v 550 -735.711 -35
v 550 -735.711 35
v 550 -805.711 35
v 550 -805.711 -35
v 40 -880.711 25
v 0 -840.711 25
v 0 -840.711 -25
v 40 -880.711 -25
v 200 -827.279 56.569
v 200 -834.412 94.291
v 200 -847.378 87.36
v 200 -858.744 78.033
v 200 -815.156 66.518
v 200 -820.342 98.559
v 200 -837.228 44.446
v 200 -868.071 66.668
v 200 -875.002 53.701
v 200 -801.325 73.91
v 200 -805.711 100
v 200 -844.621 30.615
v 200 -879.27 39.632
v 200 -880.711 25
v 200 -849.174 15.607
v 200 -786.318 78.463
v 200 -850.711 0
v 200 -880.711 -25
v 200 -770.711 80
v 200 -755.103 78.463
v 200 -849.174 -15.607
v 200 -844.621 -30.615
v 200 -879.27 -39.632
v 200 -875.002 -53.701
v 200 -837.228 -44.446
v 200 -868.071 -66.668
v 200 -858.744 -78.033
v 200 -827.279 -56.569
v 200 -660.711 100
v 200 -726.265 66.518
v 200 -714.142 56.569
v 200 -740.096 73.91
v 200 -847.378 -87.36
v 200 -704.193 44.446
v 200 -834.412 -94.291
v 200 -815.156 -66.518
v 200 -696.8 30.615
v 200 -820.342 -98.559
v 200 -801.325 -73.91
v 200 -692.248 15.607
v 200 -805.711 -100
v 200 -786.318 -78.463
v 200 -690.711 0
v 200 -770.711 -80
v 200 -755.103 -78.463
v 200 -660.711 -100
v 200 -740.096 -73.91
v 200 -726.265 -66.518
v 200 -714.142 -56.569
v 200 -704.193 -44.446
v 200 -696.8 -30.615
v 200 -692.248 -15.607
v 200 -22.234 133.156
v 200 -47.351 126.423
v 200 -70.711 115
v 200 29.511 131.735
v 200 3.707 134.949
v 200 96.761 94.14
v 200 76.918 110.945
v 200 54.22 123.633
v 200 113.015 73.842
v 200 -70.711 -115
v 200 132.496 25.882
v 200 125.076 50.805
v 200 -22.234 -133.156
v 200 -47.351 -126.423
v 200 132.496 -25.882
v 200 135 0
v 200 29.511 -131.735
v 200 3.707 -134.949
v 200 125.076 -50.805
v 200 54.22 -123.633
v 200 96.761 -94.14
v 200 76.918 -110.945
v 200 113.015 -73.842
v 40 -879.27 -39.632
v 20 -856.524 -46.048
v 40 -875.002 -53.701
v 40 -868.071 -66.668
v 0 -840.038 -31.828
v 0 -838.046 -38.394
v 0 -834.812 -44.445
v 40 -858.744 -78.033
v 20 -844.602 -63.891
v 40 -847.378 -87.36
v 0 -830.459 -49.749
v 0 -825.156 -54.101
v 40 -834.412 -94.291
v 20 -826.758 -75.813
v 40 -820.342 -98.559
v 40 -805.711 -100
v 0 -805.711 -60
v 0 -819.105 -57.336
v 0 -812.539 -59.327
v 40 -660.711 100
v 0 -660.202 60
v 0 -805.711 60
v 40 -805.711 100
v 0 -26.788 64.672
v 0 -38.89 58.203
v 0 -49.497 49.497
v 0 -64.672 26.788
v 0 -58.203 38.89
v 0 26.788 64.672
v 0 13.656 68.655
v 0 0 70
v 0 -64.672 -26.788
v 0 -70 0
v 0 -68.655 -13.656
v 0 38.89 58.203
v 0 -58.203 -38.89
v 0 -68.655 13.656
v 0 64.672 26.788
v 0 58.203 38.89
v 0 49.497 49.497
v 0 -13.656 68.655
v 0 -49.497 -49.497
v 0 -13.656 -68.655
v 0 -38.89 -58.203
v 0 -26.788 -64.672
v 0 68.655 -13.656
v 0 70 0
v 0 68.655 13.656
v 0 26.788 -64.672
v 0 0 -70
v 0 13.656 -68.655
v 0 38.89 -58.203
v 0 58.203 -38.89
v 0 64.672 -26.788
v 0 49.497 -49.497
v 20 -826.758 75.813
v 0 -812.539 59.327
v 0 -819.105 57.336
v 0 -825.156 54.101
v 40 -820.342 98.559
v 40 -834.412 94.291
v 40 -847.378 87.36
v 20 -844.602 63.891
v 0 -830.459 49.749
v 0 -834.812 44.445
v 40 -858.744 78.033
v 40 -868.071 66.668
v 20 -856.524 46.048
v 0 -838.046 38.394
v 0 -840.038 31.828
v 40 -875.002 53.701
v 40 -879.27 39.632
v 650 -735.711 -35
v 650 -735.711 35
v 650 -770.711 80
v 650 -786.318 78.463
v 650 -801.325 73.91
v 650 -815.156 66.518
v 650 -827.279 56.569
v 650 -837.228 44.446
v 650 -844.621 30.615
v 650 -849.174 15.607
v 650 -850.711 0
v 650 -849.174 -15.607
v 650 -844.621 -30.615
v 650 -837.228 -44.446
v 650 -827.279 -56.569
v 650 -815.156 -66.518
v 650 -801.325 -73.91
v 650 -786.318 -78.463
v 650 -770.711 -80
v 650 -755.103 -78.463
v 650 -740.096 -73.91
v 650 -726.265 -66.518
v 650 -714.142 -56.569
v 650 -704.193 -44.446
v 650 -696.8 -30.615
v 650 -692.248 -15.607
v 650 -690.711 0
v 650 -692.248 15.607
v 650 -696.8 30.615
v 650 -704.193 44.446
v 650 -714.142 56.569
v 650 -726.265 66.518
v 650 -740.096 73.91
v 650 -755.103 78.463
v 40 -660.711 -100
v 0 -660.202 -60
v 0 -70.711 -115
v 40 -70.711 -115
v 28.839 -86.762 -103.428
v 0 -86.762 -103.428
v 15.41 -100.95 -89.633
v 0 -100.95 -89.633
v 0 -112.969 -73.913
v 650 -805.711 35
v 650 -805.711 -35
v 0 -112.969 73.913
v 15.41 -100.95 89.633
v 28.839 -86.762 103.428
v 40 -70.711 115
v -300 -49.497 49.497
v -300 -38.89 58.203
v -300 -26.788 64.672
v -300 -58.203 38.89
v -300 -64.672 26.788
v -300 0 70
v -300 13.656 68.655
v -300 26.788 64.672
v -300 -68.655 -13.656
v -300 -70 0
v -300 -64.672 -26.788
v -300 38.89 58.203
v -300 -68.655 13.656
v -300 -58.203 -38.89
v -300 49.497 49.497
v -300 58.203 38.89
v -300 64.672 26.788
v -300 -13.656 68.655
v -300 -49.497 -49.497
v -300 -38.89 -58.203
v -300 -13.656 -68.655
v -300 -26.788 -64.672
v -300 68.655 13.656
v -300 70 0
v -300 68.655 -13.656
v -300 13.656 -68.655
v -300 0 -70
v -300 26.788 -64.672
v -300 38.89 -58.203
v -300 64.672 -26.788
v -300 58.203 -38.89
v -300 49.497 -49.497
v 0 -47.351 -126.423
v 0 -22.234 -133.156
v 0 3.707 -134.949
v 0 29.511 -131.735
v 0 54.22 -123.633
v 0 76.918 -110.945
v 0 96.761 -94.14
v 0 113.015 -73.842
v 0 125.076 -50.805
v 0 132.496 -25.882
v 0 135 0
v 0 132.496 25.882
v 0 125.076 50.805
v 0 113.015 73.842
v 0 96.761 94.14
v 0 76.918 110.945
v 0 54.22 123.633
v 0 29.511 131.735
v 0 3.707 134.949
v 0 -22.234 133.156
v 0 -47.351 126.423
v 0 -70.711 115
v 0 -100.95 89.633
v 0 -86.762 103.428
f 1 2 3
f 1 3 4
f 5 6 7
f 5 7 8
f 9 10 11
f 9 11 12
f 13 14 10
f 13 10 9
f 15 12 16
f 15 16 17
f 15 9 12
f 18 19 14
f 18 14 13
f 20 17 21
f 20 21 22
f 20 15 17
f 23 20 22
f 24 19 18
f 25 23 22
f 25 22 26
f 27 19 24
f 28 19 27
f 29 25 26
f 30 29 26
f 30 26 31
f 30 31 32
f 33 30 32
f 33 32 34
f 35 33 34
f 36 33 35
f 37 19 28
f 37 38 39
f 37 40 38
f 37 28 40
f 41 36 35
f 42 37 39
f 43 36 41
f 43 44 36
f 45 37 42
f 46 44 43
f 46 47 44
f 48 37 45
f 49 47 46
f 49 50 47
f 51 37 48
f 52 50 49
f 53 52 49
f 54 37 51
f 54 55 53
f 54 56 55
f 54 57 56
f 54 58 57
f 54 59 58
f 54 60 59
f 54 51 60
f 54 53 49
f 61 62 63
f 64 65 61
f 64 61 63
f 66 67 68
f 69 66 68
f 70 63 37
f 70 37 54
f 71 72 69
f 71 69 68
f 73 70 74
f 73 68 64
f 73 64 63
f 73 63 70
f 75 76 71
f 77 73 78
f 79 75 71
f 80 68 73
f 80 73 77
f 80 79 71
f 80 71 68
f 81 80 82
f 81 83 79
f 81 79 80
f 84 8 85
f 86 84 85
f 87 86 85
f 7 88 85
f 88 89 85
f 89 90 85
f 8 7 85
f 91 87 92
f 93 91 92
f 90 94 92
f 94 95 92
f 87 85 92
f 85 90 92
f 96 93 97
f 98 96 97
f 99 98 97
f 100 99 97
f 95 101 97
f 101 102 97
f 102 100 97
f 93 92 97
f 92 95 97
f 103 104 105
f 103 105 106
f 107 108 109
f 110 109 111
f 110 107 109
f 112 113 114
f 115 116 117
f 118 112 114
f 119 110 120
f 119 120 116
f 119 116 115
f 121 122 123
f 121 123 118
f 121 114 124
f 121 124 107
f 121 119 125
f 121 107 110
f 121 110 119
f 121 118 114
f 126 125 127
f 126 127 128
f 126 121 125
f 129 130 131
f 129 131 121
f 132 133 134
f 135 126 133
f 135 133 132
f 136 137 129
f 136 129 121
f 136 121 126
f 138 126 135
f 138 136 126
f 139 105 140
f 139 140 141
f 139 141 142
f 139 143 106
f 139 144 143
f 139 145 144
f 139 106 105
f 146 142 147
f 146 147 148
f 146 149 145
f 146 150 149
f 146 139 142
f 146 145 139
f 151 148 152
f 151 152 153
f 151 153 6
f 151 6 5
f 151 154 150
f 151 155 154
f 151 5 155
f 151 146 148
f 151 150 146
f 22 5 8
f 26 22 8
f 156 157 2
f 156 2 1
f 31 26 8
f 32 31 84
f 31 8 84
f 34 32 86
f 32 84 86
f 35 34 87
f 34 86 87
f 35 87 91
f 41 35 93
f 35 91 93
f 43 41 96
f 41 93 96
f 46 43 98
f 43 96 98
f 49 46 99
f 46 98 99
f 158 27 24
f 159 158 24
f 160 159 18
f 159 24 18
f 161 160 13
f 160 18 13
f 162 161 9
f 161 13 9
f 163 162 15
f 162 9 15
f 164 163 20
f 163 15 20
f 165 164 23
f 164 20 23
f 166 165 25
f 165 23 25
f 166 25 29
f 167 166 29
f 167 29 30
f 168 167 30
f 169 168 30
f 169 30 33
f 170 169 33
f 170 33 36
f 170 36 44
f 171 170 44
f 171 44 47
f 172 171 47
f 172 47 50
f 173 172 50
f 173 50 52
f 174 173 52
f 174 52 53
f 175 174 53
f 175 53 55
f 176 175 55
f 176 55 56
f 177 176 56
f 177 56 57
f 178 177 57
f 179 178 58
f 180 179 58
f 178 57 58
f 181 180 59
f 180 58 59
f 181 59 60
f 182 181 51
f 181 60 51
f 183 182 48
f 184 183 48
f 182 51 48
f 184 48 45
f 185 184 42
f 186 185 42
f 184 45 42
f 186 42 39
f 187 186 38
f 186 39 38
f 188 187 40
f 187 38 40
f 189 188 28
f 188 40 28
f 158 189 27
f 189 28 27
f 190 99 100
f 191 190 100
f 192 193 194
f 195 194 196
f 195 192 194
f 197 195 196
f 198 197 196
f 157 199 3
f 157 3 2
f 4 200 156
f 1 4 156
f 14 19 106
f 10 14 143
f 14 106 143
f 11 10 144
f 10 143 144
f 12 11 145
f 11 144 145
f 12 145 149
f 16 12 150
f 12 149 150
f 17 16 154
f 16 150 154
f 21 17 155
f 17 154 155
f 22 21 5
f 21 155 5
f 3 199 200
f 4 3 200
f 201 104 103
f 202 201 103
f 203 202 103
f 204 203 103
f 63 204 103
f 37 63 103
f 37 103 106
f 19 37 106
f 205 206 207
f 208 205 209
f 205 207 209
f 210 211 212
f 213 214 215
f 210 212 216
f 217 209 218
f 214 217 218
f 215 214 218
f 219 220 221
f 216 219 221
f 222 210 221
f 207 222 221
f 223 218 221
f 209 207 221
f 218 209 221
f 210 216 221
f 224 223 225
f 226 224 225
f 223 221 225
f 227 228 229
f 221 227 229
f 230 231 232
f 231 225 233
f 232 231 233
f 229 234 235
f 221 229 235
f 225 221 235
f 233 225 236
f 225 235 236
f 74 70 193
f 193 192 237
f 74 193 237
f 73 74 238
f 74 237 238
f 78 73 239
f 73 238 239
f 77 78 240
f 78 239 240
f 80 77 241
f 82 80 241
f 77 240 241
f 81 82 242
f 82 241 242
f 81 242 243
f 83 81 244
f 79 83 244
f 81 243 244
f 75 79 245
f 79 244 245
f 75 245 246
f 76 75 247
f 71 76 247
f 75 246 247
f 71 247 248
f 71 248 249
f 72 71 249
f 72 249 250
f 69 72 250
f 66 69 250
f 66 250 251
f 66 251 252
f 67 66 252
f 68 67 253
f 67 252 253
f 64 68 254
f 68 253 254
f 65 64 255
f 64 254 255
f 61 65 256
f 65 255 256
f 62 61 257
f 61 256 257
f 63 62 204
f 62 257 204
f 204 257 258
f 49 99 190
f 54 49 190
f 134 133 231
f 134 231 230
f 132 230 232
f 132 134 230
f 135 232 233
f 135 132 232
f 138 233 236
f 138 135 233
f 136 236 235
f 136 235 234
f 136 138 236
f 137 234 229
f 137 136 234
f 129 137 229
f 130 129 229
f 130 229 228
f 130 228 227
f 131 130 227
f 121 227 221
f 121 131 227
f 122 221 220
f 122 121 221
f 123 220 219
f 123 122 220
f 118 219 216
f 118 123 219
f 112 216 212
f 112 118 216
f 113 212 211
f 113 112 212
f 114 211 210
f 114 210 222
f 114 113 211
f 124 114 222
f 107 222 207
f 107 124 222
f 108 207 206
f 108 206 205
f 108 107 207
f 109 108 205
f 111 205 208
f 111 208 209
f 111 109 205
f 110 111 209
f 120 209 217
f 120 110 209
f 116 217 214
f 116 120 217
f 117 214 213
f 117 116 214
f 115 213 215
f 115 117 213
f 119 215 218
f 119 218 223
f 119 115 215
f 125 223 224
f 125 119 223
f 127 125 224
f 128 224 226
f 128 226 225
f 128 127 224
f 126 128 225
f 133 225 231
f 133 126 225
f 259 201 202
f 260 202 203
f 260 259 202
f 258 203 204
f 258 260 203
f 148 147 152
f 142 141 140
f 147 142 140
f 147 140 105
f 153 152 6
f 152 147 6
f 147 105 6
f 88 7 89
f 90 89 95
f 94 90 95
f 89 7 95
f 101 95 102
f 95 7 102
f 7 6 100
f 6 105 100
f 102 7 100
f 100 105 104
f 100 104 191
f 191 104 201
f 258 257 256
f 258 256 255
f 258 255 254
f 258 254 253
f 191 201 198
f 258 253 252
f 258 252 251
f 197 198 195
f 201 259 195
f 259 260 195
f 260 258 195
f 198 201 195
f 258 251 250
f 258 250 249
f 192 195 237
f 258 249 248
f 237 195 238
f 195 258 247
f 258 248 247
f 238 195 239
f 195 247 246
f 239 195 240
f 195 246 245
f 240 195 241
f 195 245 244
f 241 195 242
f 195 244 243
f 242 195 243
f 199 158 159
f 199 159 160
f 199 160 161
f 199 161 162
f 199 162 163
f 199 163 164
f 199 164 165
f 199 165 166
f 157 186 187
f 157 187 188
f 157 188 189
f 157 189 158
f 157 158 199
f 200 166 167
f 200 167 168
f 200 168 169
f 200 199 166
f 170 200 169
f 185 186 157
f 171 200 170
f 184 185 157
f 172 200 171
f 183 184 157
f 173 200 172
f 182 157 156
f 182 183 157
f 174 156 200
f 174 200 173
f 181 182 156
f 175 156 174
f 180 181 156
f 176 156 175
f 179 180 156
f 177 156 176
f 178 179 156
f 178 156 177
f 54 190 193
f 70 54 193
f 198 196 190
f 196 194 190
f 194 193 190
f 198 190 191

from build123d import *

# Parameters (mm, degrees)
ESQUISSE1_R             = 80
BOSS_EXTRU_1_DEPTH      = 200
BOSS_EXTRU_3_DEPTH      = 650
ESQUISSE4_W             = 70
ESQUISSE4_H             = 70
ENL_V_MAT_EXTRU_4_DEPTH = 100
ESQUISSE1_6_R           = 70
BOSS_EXTRU_4_DEPTH      = 300
CHANFREIN1_SIZE         = 40


with BuildPart() as part:
    # Esquisse1 → Boss.-Extru.1 (new body)
    with BuildSketch(Plane(origin=(0, 0, 0), x_dir=(0, 0, -1), z_dir=(1, 0, 0))):
        with BuildLine():
            ThreePointArc((115, -70.710678119), (0, 135), (-115, -70.710678119))
            Line((-115, -70.710678119), (-100, -660.710678119))
            Line((-100, -660.710678119), (-100, -805.710678119))
            ThreePointArc((-100, -805.710678119), (-78.033008589, -858.743686708), (-25, -880.710678119))
            Line((-25, -880.710678119), (25, -880.710678119))
            ThreePointArc((25, -880.710678119), (78.033008589, -858.743686708), (100, -805.710678119))
            Line((100, -805.710678119), (100, -660.710678119))
            Line((100, -660.710678119), (115, -70.710678119))
        make_face()
        with Locations((0, -770.710678119)):
            Circle(ESQUISSE1_R, mode=Mode.SUBTRACT)
    extrude(amount=BOSS_EXTRU_1_DEPTH)

    # Esquisse1<5> → Boss.-Extru.3 (add)
    with BuildSketch(Plane(origin=(0, 0, 0), x_dir=(0, 0, -1), z_dir=(1, 0, 0))):
        with BuildLine():
            ThreePointArc((80, -770.710678119), (0, -690.710678119), (-80, -770.710678119))
            Line((-80, -770.710678119), (80, -770.710678119))
        make_face()
        with BuildLine():
            Line((80, -770.710678119), (-80, -770.710678119))
            ThreePointArc((-80, -770.710678119), (0, -850.710678119), (80, -770.710678119))
        make_face()
    extrude(amount=BOSS_EXTRU_3_DEPTH)

    # Esquisse4 → Enlèv. mat.-Extru.4 (cut)
    with BuildSketch(Plane(origin=(650, 0, 0), x_dir=(0, 0, -1), z_dir=(1, 0, 0))):
        with Locations((0, -770.710678119)):
            Rectangle(ESQUISSE4_W, ESQUISSE4_H)
    extrude(amount=-ENL_V_MAT_EXTRU_4_DEPTH, mode=Mode.SUBTRACT)

    # Chanfrein1
    # the kernel refuses this chamfer: 40 mm, written as the material it takes off along each edge
    with BuildSketch(Plane(origin=(0, -805.710678119, -25), x_dir=(0, -1, 0), z_dir=(0, 0, 1))) as chanfrein1_piece_1:
        Polygon((75, CHANFREIN1_SIZE), (75 - CHANFREIN1_SIZE, 0), (75, 0), align=None)
    revolve(axis=Axis((0, -805.710678119, -25), (1, 0, 0)), revolution_arc=90, mode=Mode.SUBTRACT)
    with BuildSketch(Plane(origin=(0, -880.710678119, 25), x_dir=(0, 1, 0), z_dir=(0, 0, -1))) as chanfrein1_piece_2:
        Polygon((CHANFREIN1_SIZE, 0), (0, CHANFREIN1_SIZE), (0, 0), align=None)
    extrude(amount=50, mode=Mode.SUBTRACT)
    with BuildSketch(Plane(origin=(0, -805.710678119, 25), x_dir=(0, 0, 1), z_dir=(0, 1, 0))) as chanfrein1_piece_3:
        Polygon((75 - CHANFREIN1_SIZE, 0), (75, CHANFREIN1_SIZE), (75, 0), align=None)
    revolve(axis=Axis((0, -805.710678119, 25), (1, 0, 0)), revolution_arc=90, mode=Mode.SUBTRACT)
    with BuildSketch(Plane(origin=(0, -557.8433586, 100), x_dir=(0, 0, -1), z_dir=(0, -1, 0))) as chanfrein1_piece_4_section:
        Polygon((CHANFREIN1_SIZE, 0), (0, CHANFREIN1_SIZE), (0, 0), align=None)
    chanfrein1_piece_4 = extrude(amount=247.867319519, mode=Mode.PRIVATE)
    chanfrein1_piece_4 = split(chanfrein1_piece_4, bisect_by=Plane(origin=(18.692786983, -557.368271768, 81.313251281), z_dir=(-0.7071067811865477, -0.01797148390738359, 0.7068783670237524)), keep=Keep.TOP, mode=Mode.PRIVATE)
    add(chanfrein1_piece_4, mode=Mode.SUBTRACT)
    with BuildSketch(Plane(origin=(0, 32.123412539, 117.614426034), x_dir=(0, 0.025415516277791695, -0.999676973593137), z_dir=(0, -0.9996769735931369, -0.02541551627779169))) as chanfrein1_piece_5_section:
        Polygon((CHANFREIN1_SIZE, 0), (0, CHANFREIN1_SIZE), (0, 0), align=None)
    chanfrein1_piece_5 = extrude(amount=795.925286201, mode=Mode.PRIVATE)
    chanfrein1_piece_5 = chanfrein1_piece_5 - Plane(origin=(0, 0, 0), x_dir=(0, -0.5237828008789241, -0.851851851851852), z_dir=(-1, 0, 0)) * Cylinder(135, 1752, mode=Mode.PRIVATE)
    chanfrein1_piece_5 = split(chanfrein1_piece_5, bisect_by=Plane(origin=(28.807213017, 32.123412539, 88.807213017), z_dir=(-0.7071067811865476, 0, 0.7071067811865476)), keep=Keep.TOP, mode=Mode.PRIVATE)
    add(chanfrein1_piece_5, mode=Mode.SUBTRACT)
    with BuildSketch(Plane(origin=(0, -763.544768777, -97.385573966), x_dir=(1, 0, 0), z_dir=(0, 0.9996769735931369, -0.02541551627779147))) as chanfrein1_piece_6_section:
        Polygon((CHANFREIN1_SIZE, 0), (0, -CHANFREIN1_SIZE), (0, 0), align=None)
    chanfrein1_piece_6 = extrude(amount=795.925286201, mode=Mode.PRIVATE)
    chanfrein1_piece_6 = chanfrein1_piece_6 - Plane(origin=(0, 0, 0), x_dir=(0, -0.5237828008789241, -0.851851851851852), z_dir=(-1, 0, 0)) * Cylinder(135, 1752, mode=Mode.PRIVATE)
    chanfrein1_piece_6 = split(chanfrein1_piece_6, bisect_by=Plane(origin=(18.692786983, -763.544768777, -78.692786983), z_dir=(-0.7071067811865476, 0, -0.7071067811865476)), keep=Keep.TOP, mode=Mode.PRIVATE)
    add(chanfrein1_piece_6, mode=Mode.SUBTRACT)
    with BuildSketch(Plane(origin=(0, -805.710678119, -100), x_dir=(1, 0, 0), z_dir=(0, 1, 0))) as chanfrein1_piece_7_section:
        Polygon((CHANFREIN1_SIZE, 0), (0, -CHANFREIN1_SIZE), (0, 0), align=None)
    chanfrein1_piece_7 = extrude(amount=247.867319519, mode=Mode.PRIVATE)
    chanfrein1_piece_7 = split(chanfrein1_piece_7, bisect_by=Plane(origin=(21.84262493, -805.155536529, -78.164430815), z_dir=(-0.7071067811865477, -0.017971483907383432, -0.7068783670237524)), keep=Keep.TOP, mode=Mode.PRIVATE)
    add(chanfrein1_piece_7, mode=Mode.SUBTRACT)


with BuildPart() as body_2:
    # Esquisse1<6> → Boss.-Extru.4 (new body)
    with BuildSketch(Plane(origin=(0, 0, 0), x_dir=(0, 0, -1), z_dir=(1, 0, 0))):
        Circle(ESQUISSE1_6_R)
    extrude(amount=-BOSS_EXTRU_4_DEPTH)


solid = Compound([part.part, body_2.part])
